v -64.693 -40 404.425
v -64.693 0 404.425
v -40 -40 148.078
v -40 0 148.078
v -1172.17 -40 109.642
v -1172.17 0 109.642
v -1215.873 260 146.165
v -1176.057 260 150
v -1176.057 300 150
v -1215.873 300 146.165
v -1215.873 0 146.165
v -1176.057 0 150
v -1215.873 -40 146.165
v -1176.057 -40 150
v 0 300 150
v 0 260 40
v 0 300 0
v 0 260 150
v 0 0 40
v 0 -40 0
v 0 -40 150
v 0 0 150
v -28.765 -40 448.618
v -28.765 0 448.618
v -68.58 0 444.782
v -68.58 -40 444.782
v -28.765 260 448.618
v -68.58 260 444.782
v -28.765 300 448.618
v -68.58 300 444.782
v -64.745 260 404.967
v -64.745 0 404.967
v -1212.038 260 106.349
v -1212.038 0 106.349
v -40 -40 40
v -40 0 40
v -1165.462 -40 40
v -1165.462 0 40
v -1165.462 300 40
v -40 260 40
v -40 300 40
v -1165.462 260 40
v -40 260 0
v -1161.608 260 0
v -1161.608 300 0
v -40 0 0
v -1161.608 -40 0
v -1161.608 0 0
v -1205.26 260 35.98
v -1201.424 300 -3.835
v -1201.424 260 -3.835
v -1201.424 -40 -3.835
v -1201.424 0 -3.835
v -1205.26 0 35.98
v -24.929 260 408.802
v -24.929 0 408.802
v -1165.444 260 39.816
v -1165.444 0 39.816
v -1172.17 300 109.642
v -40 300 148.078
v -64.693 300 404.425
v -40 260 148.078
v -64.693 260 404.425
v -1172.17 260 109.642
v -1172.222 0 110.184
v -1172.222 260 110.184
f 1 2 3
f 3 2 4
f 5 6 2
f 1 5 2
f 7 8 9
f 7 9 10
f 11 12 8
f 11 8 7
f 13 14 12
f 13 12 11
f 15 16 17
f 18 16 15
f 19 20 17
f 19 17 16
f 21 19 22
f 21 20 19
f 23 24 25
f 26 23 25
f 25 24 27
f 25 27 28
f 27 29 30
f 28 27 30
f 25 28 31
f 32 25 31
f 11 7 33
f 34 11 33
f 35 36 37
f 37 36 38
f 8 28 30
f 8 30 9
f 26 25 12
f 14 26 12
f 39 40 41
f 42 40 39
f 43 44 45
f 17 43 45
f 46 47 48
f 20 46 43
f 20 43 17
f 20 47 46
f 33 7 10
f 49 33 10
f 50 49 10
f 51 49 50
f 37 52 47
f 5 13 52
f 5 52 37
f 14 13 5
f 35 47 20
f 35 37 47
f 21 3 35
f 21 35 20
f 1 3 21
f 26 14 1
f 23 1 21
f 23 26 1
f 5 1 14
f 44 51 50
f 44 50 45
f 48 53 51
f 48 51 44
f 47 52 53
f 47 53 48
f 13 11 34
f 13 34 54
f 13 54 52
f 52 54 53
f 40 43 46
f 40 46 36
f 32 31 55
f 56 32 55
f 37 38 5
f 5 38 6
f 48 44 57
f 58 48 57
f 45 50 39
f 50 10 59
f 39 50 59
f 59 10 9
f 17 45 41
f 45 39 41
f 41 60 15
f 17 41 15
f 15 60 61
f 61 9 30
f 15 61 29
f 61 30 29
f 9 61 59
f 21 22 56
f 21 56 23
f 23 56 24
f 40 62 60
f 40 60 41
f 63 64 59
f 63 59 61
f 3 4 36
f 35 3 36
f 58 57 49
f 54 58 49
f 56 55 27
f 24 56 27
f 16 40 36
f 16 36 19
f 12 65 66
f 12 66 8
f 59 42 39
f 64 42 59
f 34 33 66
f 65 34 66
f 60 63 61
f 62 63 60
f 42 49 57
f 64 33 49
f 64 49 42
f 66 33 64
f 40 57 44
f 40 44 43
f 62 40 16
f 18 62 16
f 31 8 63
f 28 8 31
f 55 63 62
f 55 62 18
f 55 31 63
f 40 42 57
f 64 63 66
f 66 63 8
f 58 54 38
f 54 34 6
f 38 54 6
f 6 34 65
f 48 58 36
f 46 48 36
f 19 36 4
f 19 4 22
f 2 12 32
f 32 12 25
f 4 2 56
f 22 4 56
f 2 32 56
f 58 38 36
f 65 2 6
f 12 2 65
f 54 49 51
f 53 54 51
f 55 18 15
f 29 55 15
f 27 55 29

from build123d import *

# Parameters (mm, degrees)
F1_DEPTH = 40
F3_W     = 40
F3_H     = 40
F4_DEPTH = 130


with BuildPart() as f1:
    # F0 (on Front) → F1 (new body)
    with BuildSketch(Plane.XZ):
        Polygon((-1215.873162, 146.164695), (-1201.424196, -3.835305), (-1161.60849, 0), (0, 0), (0, 150), (-28.764789, 448.617794), (-68.580495, 444.782489), (-1176.057456, 150), align=None)
        Polygon((-1172.169917, 109.642031), (-64.692955, 404.42452), (-40, 148.07792), (-40, 40), (-1165.461548, 40), align=None, mode=Mode.SUBTRACT)
    extrude(amount=F1_DEPTH)

    # F3 (on face) → F4 (join)
    with BuildSketch(Plane.XZ):
        Polygon((-24.929484, 408.802088), (-28.764789, 448.617794), (-68.580495, 444.782489), (-64.74519, 404.966783), align=None)
        with Locations((-20, 20)):
            Rectangle(F3_W, F3_H)
        Polygon((-1172.222151, 110.184294), (-1176.057456, 150), (-1215.873162, 146.164695), (-1212.037857, 106.348989), align=None)
        Polygon((-1161.60849, 0), (-1165.443796, 39.815706), (-1205.259501, 35.980401), (-1201.424196, -3.835305), align=None)
    extrude(amount=-F4_DEPTH)

    # F5: F1 across face


with BuildPart() as f1_1:
    add(f1.part)
    add(f1.part.mirror(Plane(origin=(-46.754989, 130, 426.792288), x_dir=(1, 0, 0), z_dir=(0, 1, 0))))


solid = f1_1.part
